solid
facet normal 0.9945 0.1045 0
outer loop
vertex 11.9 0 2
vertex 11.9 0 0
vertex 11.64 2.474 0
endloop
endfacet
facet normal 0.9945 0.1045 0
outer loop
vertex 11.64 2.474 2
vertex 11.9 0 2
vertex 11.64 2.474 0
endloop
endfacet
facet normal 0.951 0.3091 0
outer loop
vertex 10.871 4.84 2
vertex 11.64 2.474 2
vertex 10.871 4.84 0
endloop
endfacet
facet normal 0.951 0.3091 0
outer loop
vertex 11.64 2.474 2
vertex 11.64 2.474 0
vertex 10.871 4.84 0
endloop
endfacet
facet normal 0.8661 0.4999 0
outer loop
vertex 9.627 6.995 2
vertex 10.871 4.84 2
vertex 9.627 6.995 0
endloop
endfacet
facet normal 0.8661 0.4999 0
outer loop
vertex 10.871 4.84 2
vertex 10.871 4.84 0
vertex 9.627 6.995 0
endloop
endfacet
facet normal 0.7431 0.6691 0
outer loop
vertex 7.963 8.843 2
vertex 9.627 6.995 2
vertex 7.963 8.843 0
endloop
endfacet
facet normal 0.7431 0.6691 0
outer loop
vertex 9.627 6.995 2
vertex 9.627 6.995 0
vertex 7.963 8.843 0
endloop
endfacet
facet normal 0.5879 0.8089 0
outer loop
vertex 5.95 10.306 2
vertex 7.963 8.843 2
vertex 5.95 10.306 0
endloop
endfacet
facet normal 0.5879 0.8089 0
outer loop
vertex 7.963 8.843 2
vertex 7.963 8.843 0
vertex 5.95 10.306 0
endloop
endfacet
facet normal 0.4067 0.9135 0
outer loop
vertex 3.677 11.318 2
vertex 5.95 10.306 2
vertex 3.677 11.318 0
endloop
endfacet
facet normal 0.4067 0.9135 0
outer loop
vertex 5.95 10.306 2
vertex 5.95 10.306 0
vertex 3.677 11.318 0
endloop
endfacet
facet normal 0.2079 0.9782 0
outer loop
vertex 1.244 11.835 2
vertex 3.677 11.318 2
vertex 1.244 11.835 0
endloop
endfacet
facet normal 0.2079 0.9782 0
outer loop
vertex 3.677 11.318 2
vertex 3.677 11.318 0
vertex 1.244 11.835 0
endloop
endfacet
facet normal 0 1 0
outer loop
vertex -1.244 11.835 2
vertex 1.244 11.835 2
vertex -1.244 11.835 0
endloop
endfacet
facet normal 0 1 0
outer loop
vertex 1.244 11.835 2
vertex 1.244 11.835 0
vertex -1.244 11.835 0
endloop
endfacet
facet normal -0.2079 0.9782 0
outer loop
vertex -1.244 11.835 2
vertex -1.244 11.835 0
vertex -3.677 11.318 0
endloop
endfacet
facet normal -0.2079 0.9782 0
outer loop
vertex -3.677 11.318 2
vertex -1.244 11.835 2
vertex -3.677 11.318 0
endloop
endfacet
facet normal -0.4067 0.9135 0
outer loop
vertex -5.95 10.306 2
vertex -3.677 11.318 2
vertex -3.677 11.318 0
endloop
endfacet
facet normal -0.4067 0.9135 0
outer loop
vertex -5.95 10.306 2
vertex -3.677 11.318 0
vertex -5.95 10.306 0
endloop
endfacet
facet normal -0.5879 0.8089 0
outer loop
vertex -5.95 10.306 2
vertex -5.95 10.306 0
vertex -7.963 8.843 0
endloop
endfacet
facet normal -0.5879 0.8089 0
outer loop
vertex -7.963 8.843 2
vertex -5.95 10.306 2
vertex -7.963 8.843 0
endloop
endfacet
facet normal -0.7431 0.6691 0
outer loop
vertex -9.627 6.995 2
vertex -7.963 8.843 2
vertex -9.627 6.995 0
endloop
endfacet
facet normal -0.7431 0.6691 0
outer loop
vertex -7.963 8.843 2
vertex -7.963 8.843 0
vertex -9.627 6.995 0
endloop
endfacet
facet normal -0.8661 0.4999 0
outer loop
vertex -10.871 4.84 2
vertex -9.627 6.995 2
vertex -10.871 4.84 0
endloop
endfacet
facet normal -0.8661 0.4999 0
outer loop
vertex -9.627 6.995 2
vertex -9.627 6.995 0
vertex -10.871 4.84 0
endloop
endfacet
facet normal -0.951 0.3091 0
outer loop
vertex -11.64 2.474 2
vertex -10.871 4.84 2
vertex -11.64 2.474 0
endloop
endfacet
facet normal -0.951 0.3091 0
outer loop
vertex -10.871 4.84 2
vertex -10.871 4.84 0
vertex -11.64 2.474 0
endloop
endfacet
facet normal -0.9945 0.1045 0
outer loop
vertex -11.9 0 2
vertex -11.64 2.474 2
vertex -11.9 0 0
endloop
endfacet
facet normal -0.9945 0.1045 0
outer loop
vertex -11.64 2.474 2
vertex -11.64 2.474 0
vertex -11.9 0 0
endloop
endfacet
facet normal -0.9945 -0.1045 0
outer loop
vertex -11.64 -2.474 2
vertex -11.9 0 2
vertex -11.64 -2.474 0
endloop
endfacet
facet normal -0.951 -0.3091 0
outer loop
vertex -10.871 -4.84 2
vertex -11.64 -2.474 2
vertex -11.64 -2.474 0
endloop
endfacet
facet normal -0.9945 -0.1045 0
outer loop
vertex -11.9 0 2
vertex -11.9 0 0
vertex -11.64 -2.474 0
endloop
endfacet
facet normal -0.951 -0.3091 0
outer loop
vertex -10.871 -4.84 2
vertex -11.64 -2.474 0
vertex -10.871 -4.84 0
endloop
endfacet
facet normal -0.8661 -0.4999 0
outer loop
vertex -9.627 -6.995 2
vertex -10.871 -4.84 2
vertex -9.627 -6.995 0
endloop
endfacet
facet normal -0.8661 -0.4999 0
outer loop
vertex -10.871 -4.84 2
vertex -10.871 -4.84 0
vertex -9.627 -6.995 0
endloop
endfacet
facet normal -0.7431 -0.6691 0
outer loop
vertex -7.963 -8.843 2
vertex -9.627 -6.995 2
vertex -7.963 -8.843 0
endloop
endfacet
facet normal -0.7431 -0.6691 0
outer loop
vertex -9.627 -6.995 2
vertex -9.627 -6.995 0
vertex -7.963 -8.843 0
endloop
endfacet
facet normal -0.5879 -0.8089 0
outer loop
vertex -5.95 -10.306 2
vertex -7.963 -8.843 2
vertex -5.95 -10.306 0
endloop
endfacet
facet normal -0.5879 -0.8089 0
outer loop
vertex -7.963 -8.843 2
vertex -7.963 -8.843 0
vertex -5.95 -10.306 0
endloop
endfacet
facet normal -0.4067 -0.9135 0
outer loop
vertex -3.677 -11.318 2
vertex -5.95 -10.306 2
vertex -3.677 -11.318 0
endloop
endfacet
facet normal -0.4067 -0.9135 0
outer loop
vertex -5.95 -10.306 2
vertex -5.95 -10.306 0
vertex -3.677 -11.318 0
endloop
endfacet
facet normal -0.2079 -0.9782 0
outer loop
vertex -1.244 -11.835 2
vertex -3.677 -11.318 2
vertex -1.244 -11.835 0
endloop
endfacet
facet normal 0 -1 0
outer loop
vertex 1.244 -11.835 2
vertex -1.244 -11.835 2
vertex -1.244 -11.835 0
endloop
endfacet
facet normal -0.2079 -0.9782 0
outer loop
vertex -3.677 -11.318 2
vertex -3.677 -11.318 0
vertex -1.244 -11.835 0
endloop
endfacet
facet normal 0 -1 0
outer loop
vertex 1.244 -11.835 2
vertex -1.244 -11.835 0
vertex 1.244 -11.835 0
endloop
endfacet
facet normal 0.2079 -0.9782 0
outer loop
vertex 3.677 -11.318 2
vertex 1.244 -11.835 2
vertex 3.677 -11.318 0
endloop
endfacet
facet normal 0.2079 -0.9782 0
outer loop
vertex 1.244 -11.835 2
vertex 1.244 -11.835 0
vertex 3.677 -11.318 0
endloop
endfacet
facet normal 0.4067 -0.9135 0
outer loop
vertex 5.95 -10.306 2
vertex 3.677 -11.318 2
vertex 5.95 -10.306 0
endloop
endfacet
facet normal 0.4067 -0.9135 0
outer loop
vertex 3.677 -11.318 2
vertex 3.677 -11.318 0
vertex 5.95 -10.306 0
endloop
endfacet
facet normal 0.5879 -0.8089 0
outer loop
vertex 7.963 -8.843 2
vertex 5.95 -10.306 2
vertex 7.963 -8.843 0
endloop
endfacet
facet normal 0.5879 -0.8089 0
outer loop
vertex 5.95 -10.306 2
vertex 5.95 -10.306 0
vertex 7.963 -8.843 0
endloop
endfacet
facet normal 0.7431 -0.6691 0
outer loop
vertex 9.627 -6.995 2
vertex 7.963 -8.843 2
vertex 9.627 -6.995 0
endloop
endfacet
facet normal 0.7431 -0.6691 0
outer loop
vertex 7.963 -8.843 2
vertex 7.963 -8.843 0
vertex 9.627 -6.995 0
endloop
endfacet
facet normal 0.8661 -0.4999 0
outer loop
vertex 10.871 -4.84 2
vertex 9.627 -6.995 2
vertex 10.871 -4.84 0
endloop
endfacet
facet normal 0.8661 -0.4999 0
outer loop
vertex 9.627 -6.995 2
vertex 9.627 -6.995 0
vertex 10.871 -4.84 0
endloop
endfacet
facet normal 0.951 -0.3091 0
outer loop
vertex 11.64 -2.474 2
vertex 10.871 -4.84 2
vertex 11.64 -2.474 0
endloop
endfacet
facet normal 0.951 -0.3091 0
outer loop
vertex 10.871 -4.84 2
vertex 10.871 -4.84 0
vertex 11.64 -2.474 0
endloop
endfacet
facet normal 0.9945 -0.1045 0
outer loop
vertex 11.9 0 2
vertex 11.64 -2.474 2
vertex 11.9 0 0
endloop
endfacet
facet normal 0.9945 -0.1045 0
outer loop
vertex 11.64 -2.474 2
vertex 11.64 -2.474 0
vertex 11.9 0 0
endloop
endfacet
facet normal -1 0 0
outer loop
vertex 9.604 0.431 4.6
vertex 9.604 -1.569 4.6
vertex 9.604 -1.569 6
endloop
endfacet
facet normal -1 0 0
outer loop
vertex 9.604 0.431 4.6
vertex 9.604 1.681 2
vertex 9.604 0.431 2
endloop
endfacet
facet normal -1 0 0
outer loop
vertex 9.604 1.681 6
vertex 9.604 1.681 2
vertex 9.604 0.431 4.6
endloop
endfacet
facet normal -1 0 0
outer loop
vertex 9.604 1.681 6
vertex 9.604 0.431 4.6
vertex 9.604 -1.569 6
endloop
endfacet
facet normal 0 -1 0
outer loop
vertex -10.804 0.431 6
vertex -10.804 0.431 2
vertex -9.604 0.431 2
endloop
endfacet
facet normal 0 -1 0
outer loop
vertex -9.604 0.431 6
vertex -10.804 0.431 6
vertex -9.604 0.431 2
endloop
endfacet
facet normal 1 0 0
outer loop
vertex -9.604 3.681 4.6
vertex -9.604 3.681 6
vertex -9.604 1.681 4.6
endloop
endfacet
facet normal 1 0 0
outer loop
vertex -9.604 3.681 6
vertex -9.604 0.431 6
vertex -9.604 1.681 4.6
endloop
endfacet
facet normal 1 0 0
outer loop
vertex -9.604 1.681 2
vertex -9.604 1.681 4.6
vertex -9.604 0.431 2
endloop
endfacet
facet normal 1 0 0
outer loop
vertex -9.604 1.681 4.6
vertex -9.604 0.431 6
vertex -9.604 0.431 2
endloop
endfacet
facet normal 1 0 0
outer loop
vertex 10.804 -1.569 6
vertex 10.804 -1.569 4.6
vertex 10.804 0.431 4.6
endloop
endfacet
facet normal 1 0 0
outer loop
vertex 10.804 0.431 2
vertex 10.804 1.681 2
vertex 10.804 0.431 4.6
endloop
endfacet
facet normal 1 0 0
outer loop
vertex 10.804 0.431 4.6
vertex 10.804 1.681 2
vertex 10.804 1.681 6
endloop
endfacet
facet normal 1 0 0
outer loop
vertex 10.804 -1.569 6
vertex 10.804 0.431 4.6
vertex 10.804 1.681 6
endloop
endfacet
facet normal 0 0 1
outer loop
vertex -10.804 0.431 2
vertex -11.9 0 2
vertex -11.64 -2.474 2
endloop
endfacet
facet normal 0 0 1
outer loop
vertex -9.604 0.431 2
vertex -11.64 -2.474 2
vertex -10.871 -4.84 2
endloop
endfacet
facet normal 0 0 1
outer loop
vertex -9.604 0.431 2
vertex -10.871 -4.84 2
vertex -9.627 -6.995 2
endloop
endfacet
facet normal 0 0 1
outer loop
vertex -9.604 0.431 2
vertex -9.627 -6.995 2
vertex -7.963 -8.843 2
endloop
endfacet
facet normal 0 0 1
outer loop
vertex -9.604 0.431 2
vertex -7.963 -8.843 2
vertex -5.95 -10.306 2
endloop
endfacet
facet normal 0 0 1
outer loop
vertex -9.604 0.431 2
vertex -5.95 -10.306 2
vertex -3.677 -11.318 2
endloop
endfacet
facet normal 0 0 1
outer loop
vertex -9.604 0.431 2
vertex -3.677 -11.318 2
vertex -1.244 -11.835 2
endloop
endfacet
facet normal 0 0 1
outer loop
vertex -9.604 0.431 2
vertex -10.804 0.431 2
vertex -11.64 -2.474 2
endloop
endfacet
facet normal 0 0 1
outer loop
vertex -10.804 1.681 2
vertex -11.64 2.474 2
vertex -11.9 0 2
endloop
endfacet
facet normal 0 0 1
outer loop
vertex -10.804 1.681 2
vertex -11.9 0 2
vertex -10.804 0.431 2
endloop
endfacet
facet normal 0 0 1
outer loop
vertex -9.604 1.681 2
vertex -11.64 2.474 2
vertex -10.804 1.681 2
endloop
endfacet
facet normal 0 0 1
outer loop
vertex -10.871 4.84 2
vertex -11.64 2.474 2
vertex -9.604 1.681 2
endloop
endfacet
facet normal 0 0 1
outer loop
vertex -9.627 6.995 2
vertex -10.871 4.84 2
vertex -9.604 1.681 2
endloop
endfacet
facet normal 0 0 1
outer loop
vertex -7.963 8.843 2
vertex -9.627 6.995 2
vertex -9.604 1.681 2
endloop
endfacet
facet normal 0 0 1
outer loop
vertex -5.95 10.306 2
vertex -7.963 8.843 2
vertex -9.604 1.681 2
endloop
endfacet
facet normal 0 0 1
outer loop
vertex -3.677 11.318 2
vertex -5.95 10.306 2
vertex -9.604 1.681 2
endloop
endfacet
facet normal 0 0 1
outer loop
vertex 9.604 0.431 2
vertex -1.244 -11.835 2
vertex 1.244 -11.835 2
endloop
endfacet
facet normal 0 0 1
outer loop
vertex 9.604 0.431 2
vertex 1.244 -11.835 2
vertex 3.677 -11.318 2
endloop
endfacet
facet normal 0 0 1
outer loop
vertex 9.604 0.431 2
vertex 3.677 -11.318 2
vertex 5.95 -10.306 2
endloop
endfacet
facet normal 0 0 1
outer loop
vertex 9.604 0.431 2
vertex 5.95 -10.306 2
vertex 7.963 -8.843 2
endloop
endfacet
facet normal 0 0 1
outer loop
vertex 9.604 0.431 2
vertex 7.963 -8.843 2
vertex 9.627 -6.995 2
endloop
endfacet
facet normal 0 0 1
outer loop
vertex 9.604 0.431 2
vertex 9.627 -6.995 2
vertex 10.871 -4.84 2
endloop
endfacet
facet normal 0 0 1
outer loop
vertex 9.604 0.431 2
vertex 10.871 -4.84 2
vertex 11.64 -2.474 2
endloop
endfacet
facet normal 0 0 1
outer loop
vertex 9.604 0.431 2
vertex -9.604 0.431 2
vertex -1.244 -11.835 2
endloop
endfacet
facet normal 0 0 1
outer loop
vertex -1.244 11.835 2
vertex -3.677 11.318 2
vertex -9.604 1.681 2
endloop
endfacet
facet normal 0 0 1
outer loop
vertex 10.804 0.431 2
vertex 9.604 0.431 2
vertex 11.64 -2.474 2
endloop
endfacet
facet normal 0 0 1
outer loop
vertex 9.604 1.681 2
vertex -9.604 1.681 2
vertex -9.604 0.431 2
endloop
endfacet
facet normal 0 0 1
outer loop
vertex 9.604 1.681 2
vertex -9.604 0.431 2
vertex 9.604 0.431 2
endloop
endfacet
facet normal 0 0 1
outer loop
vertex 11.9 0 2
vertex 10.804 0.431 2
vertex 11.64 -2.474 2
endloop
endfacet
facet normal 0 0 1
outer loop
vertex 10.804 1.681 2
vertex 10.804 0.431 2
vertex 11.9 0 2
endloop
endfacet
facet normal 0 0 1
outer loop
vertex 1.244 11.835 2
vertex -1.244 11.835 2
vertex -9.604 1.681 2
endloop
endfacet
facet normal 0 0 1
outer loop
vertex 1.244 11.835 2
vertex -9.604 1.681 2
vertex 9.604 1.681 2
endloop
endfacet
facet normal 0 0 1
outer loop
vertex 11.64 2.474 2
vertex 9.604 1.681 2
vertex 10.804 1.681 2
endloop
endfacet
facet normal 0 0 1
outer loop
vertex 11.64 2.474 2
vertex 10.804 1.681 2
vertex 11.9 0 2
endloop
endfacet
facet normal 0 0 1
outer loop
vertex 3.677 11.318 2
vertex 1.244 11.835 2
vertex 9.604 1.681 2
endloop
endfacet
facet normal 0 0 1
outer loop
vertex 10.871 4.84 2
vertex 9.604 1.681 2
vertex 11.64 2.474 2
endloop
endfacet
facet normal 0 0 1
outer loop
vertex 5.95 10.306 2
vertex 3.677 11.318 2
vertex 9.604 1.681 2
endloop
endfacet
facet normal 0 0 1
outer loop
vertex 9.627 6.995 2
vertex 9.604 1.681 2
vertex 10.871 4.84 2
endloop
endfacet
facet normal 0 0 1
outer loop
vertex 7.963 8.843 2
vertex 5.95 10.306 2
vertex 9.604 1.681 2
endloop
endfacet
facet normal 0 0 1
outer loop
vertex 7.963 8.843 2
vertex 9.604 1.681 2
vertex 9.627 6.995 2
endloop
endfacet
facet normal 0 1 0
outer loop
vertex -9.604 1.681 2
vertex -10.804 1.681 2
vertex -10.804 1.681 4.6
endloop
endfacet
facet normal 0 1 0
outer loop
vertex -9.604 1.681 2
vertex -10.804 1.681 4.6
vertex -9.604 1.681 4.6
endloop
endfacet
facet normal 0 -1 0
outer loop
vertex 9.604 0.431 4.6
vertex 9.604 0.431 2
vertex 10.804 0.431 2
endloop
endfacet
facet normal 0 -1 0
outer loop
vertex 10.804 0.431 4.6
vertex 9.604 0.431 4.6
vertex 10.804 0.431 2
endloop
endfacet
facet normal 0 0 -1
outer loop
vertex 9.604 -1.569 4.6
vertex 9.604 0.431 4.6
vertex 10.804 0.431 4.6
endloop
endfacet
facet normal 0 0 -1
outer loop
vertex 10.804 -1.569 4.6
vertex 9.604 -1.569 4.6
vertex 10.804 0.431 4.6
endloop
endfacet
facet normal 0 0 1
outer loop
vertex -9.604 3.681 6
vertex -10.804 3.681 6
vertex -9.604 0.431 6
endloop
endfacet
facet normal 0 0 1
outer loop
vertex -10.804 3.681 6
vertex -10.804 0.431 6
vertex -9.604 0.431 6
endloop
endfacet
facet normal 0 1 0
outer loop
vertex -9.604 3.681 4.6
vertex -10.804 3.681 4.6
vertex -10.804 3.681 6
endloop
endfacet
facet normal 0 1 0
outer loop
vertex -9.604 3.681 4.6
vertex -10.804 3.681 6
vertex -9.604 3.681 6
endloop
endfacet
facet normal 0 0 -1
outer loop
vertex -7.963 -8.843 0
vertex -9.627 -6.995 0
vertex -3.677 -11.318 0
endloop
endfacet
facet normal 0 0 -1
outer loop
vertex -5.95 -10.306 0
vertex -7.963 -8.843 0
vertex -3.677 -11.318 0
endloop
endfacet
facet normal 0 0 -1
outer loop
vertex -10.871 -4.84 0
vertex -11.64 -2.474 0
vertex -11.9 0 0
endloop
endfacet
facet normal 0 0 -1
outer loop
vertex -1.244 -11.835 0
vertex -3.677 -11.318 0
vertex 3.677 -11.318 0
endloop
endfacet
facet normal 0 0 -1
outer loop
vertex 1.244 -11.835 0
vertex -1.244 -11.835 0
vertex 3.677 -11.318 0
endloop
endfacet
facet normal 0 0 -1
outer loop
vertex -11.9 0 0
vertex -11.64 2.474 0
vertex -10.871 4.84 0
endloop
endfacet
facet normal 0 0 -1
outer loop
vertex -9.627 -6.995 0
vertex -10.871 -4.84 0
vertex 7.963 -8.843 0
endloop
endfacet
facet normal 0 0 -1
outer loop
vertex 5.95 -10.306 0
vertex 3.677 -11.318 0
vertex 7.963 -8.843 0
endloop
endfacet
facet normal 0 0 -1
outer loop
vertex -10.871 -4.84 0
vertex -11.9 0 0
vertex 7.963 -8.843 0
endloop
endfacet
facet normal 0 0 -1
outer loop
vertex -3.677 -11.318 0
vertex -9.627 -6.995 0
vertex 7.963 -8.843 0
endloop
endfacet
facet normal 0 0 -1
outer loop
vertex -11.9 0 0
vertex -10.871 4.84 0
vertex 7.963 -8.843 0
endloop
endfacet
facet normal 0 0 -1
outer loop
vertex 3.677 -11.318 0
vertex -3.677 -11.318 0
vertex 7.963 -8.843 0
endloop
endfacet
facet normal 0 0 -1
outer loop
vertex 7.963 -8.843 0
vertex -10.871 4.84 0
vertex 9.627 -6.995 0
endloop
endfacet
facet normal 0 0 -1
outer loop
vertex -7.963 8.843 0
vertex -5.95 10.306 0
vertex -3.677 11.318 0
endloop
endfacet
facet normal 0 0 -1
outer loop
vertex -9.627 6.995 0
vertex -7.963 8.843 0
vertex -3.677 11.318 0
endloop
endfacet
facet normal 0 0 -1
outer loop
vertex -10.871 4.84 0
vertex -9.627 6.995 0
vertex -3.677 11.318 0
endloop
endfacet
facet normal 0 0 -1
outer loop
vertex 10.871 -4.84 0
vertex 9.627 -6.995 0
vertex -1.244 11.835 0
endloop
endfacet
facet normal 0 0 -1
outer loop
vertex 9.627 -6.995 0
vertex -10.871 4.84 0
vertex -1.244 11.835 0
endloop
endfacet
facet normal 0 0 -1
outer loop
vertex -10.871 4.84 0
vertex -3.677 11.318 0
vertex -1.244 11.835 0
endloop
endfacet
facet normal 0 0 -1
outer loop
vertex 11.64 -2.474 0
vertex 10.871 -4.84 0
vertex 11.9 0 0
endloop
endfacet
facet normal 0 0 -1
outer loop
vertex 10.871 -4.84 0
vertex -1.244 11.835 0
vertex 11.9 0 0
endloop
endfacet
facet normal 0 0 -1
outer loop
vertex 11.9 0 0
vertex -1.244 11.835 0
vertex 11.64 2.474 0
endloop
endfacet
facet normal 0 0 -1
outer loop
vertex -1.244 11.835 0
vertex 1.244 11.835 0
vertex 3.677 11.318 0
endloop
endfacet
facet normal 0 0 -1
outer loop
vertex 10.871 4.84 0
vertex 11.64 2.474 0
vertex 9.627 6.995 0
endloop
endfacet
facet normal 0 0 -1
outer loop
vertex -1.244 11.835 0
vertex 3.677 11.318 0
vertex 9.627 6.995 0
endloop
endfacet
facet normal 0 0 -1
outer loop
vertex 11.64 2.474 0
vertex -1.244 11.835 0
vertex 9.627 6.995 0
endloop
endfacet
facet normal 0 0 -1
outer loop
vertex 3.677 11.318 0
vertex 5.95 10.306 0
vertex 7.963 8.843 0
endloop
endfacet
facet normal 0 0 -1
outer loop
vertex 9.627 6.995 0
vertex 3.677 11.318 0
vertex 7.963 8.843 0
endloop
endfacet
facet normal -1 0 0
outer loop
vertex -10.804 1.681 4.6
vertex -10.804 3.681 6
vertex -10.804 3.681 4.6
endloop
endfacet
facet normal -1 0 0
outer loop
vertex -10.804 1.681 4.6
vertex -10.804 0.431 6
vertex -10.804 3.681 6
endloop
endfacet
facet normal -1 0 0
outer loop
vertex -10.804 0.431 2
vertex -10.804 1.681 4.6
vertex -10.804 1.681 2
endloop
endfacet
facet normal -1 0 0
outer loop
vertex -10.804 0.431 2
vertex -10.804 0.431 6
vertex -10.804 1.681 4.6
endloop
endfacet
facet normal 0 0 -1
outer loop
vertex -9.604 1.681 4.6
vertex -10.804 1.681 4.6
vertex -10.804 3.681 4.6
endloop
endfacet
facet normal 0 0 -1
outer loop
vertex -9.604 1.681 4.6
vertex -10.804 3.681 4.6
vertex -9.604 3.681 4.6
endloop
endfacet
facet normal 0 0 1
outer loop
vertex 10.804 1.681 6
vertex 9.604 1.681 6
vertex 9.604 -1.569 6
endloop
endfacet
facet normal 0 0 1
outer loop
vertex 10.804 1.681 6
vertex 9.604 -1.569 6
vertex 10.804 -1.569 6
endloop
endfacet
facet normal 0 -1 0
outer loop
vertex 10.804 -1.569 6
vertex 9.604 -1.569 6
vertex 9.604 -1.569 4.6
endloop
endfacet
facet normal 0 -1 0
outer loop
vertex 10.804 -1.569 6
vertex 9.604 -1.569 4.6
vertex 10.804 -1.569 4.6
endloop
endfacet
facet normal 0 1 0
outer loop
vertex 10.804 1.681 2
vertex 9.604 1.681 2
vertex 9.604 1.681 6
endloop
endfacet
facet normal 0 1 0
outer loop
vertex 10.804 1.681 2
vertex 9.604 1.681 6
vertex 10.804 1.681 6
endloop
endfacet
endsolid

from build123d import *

# Parameters (mm, degrees)
SKETCH1_R           = 11.9
BOSS_EXTRUDE1_DEPTH = 2
SKETCH2_W           = 1.2
SKETCH2_H           = 1.25
BOSS_EXTRUDE2_DEPTH = 4
SKETCH3_W           = 1.2
SKETCH3_H           = 1.4
BOSS_EXTRUDE3_DEPTH = 2
SKETCH4_W           = 1.2
SKETCH4_H           = 1.4
BOSS_EXTRUDE4_DEPTH = 2


with BuildPart() as part:
    # Sketch1 → Boss-Extrude1 (new body)
    with BuildSketch(Plane.XY):
        Circle(SKETCH1_R)
    extrude(amount=BOSS_EXTRUDE1_DEPTH)

    # Sketch2 → Boss-Extrude2 (add)
    with BuildSketch(Plane.XY.offset(2)):
        with Locations((10.203511987, 1.056286149)):
            Rectangle(SKETCH2_W, SKETCH2_H)
        with Locations((-10.203511987, 1.056286149)):
            Rectangle(SKETCH2_W, SKETCH2_H)
    extrude(amount=BOSS_EXTRUDE2_DEPTH)

    # Sketch3 → Boss-Extrude3 (add)
    with BuildSketch(Plane(origin=(0, 1.681286149, 0), x_dir=(1, 0, 0), z_dir=(0, 1, 0))):
        with Locations((-10.203511987, -5.3)):
            Rectangle(SKETCH3_W, SKETCH3_H)
    extrude(amount=BOSS_EXTRUDE3_DEPTH)

    # Sketch4 → Boss-Extrude4 (add)
    with BuildSketch(Plane.XZ.offset(-0.431286149)):
        with Locations((10.203511987, 5.3)):
            Rectangle(SKETCH4_W, SKETCH4_H)
    extrude(amount=BOSS_EXTRUDE4_DEPTH)


solid = part.part
